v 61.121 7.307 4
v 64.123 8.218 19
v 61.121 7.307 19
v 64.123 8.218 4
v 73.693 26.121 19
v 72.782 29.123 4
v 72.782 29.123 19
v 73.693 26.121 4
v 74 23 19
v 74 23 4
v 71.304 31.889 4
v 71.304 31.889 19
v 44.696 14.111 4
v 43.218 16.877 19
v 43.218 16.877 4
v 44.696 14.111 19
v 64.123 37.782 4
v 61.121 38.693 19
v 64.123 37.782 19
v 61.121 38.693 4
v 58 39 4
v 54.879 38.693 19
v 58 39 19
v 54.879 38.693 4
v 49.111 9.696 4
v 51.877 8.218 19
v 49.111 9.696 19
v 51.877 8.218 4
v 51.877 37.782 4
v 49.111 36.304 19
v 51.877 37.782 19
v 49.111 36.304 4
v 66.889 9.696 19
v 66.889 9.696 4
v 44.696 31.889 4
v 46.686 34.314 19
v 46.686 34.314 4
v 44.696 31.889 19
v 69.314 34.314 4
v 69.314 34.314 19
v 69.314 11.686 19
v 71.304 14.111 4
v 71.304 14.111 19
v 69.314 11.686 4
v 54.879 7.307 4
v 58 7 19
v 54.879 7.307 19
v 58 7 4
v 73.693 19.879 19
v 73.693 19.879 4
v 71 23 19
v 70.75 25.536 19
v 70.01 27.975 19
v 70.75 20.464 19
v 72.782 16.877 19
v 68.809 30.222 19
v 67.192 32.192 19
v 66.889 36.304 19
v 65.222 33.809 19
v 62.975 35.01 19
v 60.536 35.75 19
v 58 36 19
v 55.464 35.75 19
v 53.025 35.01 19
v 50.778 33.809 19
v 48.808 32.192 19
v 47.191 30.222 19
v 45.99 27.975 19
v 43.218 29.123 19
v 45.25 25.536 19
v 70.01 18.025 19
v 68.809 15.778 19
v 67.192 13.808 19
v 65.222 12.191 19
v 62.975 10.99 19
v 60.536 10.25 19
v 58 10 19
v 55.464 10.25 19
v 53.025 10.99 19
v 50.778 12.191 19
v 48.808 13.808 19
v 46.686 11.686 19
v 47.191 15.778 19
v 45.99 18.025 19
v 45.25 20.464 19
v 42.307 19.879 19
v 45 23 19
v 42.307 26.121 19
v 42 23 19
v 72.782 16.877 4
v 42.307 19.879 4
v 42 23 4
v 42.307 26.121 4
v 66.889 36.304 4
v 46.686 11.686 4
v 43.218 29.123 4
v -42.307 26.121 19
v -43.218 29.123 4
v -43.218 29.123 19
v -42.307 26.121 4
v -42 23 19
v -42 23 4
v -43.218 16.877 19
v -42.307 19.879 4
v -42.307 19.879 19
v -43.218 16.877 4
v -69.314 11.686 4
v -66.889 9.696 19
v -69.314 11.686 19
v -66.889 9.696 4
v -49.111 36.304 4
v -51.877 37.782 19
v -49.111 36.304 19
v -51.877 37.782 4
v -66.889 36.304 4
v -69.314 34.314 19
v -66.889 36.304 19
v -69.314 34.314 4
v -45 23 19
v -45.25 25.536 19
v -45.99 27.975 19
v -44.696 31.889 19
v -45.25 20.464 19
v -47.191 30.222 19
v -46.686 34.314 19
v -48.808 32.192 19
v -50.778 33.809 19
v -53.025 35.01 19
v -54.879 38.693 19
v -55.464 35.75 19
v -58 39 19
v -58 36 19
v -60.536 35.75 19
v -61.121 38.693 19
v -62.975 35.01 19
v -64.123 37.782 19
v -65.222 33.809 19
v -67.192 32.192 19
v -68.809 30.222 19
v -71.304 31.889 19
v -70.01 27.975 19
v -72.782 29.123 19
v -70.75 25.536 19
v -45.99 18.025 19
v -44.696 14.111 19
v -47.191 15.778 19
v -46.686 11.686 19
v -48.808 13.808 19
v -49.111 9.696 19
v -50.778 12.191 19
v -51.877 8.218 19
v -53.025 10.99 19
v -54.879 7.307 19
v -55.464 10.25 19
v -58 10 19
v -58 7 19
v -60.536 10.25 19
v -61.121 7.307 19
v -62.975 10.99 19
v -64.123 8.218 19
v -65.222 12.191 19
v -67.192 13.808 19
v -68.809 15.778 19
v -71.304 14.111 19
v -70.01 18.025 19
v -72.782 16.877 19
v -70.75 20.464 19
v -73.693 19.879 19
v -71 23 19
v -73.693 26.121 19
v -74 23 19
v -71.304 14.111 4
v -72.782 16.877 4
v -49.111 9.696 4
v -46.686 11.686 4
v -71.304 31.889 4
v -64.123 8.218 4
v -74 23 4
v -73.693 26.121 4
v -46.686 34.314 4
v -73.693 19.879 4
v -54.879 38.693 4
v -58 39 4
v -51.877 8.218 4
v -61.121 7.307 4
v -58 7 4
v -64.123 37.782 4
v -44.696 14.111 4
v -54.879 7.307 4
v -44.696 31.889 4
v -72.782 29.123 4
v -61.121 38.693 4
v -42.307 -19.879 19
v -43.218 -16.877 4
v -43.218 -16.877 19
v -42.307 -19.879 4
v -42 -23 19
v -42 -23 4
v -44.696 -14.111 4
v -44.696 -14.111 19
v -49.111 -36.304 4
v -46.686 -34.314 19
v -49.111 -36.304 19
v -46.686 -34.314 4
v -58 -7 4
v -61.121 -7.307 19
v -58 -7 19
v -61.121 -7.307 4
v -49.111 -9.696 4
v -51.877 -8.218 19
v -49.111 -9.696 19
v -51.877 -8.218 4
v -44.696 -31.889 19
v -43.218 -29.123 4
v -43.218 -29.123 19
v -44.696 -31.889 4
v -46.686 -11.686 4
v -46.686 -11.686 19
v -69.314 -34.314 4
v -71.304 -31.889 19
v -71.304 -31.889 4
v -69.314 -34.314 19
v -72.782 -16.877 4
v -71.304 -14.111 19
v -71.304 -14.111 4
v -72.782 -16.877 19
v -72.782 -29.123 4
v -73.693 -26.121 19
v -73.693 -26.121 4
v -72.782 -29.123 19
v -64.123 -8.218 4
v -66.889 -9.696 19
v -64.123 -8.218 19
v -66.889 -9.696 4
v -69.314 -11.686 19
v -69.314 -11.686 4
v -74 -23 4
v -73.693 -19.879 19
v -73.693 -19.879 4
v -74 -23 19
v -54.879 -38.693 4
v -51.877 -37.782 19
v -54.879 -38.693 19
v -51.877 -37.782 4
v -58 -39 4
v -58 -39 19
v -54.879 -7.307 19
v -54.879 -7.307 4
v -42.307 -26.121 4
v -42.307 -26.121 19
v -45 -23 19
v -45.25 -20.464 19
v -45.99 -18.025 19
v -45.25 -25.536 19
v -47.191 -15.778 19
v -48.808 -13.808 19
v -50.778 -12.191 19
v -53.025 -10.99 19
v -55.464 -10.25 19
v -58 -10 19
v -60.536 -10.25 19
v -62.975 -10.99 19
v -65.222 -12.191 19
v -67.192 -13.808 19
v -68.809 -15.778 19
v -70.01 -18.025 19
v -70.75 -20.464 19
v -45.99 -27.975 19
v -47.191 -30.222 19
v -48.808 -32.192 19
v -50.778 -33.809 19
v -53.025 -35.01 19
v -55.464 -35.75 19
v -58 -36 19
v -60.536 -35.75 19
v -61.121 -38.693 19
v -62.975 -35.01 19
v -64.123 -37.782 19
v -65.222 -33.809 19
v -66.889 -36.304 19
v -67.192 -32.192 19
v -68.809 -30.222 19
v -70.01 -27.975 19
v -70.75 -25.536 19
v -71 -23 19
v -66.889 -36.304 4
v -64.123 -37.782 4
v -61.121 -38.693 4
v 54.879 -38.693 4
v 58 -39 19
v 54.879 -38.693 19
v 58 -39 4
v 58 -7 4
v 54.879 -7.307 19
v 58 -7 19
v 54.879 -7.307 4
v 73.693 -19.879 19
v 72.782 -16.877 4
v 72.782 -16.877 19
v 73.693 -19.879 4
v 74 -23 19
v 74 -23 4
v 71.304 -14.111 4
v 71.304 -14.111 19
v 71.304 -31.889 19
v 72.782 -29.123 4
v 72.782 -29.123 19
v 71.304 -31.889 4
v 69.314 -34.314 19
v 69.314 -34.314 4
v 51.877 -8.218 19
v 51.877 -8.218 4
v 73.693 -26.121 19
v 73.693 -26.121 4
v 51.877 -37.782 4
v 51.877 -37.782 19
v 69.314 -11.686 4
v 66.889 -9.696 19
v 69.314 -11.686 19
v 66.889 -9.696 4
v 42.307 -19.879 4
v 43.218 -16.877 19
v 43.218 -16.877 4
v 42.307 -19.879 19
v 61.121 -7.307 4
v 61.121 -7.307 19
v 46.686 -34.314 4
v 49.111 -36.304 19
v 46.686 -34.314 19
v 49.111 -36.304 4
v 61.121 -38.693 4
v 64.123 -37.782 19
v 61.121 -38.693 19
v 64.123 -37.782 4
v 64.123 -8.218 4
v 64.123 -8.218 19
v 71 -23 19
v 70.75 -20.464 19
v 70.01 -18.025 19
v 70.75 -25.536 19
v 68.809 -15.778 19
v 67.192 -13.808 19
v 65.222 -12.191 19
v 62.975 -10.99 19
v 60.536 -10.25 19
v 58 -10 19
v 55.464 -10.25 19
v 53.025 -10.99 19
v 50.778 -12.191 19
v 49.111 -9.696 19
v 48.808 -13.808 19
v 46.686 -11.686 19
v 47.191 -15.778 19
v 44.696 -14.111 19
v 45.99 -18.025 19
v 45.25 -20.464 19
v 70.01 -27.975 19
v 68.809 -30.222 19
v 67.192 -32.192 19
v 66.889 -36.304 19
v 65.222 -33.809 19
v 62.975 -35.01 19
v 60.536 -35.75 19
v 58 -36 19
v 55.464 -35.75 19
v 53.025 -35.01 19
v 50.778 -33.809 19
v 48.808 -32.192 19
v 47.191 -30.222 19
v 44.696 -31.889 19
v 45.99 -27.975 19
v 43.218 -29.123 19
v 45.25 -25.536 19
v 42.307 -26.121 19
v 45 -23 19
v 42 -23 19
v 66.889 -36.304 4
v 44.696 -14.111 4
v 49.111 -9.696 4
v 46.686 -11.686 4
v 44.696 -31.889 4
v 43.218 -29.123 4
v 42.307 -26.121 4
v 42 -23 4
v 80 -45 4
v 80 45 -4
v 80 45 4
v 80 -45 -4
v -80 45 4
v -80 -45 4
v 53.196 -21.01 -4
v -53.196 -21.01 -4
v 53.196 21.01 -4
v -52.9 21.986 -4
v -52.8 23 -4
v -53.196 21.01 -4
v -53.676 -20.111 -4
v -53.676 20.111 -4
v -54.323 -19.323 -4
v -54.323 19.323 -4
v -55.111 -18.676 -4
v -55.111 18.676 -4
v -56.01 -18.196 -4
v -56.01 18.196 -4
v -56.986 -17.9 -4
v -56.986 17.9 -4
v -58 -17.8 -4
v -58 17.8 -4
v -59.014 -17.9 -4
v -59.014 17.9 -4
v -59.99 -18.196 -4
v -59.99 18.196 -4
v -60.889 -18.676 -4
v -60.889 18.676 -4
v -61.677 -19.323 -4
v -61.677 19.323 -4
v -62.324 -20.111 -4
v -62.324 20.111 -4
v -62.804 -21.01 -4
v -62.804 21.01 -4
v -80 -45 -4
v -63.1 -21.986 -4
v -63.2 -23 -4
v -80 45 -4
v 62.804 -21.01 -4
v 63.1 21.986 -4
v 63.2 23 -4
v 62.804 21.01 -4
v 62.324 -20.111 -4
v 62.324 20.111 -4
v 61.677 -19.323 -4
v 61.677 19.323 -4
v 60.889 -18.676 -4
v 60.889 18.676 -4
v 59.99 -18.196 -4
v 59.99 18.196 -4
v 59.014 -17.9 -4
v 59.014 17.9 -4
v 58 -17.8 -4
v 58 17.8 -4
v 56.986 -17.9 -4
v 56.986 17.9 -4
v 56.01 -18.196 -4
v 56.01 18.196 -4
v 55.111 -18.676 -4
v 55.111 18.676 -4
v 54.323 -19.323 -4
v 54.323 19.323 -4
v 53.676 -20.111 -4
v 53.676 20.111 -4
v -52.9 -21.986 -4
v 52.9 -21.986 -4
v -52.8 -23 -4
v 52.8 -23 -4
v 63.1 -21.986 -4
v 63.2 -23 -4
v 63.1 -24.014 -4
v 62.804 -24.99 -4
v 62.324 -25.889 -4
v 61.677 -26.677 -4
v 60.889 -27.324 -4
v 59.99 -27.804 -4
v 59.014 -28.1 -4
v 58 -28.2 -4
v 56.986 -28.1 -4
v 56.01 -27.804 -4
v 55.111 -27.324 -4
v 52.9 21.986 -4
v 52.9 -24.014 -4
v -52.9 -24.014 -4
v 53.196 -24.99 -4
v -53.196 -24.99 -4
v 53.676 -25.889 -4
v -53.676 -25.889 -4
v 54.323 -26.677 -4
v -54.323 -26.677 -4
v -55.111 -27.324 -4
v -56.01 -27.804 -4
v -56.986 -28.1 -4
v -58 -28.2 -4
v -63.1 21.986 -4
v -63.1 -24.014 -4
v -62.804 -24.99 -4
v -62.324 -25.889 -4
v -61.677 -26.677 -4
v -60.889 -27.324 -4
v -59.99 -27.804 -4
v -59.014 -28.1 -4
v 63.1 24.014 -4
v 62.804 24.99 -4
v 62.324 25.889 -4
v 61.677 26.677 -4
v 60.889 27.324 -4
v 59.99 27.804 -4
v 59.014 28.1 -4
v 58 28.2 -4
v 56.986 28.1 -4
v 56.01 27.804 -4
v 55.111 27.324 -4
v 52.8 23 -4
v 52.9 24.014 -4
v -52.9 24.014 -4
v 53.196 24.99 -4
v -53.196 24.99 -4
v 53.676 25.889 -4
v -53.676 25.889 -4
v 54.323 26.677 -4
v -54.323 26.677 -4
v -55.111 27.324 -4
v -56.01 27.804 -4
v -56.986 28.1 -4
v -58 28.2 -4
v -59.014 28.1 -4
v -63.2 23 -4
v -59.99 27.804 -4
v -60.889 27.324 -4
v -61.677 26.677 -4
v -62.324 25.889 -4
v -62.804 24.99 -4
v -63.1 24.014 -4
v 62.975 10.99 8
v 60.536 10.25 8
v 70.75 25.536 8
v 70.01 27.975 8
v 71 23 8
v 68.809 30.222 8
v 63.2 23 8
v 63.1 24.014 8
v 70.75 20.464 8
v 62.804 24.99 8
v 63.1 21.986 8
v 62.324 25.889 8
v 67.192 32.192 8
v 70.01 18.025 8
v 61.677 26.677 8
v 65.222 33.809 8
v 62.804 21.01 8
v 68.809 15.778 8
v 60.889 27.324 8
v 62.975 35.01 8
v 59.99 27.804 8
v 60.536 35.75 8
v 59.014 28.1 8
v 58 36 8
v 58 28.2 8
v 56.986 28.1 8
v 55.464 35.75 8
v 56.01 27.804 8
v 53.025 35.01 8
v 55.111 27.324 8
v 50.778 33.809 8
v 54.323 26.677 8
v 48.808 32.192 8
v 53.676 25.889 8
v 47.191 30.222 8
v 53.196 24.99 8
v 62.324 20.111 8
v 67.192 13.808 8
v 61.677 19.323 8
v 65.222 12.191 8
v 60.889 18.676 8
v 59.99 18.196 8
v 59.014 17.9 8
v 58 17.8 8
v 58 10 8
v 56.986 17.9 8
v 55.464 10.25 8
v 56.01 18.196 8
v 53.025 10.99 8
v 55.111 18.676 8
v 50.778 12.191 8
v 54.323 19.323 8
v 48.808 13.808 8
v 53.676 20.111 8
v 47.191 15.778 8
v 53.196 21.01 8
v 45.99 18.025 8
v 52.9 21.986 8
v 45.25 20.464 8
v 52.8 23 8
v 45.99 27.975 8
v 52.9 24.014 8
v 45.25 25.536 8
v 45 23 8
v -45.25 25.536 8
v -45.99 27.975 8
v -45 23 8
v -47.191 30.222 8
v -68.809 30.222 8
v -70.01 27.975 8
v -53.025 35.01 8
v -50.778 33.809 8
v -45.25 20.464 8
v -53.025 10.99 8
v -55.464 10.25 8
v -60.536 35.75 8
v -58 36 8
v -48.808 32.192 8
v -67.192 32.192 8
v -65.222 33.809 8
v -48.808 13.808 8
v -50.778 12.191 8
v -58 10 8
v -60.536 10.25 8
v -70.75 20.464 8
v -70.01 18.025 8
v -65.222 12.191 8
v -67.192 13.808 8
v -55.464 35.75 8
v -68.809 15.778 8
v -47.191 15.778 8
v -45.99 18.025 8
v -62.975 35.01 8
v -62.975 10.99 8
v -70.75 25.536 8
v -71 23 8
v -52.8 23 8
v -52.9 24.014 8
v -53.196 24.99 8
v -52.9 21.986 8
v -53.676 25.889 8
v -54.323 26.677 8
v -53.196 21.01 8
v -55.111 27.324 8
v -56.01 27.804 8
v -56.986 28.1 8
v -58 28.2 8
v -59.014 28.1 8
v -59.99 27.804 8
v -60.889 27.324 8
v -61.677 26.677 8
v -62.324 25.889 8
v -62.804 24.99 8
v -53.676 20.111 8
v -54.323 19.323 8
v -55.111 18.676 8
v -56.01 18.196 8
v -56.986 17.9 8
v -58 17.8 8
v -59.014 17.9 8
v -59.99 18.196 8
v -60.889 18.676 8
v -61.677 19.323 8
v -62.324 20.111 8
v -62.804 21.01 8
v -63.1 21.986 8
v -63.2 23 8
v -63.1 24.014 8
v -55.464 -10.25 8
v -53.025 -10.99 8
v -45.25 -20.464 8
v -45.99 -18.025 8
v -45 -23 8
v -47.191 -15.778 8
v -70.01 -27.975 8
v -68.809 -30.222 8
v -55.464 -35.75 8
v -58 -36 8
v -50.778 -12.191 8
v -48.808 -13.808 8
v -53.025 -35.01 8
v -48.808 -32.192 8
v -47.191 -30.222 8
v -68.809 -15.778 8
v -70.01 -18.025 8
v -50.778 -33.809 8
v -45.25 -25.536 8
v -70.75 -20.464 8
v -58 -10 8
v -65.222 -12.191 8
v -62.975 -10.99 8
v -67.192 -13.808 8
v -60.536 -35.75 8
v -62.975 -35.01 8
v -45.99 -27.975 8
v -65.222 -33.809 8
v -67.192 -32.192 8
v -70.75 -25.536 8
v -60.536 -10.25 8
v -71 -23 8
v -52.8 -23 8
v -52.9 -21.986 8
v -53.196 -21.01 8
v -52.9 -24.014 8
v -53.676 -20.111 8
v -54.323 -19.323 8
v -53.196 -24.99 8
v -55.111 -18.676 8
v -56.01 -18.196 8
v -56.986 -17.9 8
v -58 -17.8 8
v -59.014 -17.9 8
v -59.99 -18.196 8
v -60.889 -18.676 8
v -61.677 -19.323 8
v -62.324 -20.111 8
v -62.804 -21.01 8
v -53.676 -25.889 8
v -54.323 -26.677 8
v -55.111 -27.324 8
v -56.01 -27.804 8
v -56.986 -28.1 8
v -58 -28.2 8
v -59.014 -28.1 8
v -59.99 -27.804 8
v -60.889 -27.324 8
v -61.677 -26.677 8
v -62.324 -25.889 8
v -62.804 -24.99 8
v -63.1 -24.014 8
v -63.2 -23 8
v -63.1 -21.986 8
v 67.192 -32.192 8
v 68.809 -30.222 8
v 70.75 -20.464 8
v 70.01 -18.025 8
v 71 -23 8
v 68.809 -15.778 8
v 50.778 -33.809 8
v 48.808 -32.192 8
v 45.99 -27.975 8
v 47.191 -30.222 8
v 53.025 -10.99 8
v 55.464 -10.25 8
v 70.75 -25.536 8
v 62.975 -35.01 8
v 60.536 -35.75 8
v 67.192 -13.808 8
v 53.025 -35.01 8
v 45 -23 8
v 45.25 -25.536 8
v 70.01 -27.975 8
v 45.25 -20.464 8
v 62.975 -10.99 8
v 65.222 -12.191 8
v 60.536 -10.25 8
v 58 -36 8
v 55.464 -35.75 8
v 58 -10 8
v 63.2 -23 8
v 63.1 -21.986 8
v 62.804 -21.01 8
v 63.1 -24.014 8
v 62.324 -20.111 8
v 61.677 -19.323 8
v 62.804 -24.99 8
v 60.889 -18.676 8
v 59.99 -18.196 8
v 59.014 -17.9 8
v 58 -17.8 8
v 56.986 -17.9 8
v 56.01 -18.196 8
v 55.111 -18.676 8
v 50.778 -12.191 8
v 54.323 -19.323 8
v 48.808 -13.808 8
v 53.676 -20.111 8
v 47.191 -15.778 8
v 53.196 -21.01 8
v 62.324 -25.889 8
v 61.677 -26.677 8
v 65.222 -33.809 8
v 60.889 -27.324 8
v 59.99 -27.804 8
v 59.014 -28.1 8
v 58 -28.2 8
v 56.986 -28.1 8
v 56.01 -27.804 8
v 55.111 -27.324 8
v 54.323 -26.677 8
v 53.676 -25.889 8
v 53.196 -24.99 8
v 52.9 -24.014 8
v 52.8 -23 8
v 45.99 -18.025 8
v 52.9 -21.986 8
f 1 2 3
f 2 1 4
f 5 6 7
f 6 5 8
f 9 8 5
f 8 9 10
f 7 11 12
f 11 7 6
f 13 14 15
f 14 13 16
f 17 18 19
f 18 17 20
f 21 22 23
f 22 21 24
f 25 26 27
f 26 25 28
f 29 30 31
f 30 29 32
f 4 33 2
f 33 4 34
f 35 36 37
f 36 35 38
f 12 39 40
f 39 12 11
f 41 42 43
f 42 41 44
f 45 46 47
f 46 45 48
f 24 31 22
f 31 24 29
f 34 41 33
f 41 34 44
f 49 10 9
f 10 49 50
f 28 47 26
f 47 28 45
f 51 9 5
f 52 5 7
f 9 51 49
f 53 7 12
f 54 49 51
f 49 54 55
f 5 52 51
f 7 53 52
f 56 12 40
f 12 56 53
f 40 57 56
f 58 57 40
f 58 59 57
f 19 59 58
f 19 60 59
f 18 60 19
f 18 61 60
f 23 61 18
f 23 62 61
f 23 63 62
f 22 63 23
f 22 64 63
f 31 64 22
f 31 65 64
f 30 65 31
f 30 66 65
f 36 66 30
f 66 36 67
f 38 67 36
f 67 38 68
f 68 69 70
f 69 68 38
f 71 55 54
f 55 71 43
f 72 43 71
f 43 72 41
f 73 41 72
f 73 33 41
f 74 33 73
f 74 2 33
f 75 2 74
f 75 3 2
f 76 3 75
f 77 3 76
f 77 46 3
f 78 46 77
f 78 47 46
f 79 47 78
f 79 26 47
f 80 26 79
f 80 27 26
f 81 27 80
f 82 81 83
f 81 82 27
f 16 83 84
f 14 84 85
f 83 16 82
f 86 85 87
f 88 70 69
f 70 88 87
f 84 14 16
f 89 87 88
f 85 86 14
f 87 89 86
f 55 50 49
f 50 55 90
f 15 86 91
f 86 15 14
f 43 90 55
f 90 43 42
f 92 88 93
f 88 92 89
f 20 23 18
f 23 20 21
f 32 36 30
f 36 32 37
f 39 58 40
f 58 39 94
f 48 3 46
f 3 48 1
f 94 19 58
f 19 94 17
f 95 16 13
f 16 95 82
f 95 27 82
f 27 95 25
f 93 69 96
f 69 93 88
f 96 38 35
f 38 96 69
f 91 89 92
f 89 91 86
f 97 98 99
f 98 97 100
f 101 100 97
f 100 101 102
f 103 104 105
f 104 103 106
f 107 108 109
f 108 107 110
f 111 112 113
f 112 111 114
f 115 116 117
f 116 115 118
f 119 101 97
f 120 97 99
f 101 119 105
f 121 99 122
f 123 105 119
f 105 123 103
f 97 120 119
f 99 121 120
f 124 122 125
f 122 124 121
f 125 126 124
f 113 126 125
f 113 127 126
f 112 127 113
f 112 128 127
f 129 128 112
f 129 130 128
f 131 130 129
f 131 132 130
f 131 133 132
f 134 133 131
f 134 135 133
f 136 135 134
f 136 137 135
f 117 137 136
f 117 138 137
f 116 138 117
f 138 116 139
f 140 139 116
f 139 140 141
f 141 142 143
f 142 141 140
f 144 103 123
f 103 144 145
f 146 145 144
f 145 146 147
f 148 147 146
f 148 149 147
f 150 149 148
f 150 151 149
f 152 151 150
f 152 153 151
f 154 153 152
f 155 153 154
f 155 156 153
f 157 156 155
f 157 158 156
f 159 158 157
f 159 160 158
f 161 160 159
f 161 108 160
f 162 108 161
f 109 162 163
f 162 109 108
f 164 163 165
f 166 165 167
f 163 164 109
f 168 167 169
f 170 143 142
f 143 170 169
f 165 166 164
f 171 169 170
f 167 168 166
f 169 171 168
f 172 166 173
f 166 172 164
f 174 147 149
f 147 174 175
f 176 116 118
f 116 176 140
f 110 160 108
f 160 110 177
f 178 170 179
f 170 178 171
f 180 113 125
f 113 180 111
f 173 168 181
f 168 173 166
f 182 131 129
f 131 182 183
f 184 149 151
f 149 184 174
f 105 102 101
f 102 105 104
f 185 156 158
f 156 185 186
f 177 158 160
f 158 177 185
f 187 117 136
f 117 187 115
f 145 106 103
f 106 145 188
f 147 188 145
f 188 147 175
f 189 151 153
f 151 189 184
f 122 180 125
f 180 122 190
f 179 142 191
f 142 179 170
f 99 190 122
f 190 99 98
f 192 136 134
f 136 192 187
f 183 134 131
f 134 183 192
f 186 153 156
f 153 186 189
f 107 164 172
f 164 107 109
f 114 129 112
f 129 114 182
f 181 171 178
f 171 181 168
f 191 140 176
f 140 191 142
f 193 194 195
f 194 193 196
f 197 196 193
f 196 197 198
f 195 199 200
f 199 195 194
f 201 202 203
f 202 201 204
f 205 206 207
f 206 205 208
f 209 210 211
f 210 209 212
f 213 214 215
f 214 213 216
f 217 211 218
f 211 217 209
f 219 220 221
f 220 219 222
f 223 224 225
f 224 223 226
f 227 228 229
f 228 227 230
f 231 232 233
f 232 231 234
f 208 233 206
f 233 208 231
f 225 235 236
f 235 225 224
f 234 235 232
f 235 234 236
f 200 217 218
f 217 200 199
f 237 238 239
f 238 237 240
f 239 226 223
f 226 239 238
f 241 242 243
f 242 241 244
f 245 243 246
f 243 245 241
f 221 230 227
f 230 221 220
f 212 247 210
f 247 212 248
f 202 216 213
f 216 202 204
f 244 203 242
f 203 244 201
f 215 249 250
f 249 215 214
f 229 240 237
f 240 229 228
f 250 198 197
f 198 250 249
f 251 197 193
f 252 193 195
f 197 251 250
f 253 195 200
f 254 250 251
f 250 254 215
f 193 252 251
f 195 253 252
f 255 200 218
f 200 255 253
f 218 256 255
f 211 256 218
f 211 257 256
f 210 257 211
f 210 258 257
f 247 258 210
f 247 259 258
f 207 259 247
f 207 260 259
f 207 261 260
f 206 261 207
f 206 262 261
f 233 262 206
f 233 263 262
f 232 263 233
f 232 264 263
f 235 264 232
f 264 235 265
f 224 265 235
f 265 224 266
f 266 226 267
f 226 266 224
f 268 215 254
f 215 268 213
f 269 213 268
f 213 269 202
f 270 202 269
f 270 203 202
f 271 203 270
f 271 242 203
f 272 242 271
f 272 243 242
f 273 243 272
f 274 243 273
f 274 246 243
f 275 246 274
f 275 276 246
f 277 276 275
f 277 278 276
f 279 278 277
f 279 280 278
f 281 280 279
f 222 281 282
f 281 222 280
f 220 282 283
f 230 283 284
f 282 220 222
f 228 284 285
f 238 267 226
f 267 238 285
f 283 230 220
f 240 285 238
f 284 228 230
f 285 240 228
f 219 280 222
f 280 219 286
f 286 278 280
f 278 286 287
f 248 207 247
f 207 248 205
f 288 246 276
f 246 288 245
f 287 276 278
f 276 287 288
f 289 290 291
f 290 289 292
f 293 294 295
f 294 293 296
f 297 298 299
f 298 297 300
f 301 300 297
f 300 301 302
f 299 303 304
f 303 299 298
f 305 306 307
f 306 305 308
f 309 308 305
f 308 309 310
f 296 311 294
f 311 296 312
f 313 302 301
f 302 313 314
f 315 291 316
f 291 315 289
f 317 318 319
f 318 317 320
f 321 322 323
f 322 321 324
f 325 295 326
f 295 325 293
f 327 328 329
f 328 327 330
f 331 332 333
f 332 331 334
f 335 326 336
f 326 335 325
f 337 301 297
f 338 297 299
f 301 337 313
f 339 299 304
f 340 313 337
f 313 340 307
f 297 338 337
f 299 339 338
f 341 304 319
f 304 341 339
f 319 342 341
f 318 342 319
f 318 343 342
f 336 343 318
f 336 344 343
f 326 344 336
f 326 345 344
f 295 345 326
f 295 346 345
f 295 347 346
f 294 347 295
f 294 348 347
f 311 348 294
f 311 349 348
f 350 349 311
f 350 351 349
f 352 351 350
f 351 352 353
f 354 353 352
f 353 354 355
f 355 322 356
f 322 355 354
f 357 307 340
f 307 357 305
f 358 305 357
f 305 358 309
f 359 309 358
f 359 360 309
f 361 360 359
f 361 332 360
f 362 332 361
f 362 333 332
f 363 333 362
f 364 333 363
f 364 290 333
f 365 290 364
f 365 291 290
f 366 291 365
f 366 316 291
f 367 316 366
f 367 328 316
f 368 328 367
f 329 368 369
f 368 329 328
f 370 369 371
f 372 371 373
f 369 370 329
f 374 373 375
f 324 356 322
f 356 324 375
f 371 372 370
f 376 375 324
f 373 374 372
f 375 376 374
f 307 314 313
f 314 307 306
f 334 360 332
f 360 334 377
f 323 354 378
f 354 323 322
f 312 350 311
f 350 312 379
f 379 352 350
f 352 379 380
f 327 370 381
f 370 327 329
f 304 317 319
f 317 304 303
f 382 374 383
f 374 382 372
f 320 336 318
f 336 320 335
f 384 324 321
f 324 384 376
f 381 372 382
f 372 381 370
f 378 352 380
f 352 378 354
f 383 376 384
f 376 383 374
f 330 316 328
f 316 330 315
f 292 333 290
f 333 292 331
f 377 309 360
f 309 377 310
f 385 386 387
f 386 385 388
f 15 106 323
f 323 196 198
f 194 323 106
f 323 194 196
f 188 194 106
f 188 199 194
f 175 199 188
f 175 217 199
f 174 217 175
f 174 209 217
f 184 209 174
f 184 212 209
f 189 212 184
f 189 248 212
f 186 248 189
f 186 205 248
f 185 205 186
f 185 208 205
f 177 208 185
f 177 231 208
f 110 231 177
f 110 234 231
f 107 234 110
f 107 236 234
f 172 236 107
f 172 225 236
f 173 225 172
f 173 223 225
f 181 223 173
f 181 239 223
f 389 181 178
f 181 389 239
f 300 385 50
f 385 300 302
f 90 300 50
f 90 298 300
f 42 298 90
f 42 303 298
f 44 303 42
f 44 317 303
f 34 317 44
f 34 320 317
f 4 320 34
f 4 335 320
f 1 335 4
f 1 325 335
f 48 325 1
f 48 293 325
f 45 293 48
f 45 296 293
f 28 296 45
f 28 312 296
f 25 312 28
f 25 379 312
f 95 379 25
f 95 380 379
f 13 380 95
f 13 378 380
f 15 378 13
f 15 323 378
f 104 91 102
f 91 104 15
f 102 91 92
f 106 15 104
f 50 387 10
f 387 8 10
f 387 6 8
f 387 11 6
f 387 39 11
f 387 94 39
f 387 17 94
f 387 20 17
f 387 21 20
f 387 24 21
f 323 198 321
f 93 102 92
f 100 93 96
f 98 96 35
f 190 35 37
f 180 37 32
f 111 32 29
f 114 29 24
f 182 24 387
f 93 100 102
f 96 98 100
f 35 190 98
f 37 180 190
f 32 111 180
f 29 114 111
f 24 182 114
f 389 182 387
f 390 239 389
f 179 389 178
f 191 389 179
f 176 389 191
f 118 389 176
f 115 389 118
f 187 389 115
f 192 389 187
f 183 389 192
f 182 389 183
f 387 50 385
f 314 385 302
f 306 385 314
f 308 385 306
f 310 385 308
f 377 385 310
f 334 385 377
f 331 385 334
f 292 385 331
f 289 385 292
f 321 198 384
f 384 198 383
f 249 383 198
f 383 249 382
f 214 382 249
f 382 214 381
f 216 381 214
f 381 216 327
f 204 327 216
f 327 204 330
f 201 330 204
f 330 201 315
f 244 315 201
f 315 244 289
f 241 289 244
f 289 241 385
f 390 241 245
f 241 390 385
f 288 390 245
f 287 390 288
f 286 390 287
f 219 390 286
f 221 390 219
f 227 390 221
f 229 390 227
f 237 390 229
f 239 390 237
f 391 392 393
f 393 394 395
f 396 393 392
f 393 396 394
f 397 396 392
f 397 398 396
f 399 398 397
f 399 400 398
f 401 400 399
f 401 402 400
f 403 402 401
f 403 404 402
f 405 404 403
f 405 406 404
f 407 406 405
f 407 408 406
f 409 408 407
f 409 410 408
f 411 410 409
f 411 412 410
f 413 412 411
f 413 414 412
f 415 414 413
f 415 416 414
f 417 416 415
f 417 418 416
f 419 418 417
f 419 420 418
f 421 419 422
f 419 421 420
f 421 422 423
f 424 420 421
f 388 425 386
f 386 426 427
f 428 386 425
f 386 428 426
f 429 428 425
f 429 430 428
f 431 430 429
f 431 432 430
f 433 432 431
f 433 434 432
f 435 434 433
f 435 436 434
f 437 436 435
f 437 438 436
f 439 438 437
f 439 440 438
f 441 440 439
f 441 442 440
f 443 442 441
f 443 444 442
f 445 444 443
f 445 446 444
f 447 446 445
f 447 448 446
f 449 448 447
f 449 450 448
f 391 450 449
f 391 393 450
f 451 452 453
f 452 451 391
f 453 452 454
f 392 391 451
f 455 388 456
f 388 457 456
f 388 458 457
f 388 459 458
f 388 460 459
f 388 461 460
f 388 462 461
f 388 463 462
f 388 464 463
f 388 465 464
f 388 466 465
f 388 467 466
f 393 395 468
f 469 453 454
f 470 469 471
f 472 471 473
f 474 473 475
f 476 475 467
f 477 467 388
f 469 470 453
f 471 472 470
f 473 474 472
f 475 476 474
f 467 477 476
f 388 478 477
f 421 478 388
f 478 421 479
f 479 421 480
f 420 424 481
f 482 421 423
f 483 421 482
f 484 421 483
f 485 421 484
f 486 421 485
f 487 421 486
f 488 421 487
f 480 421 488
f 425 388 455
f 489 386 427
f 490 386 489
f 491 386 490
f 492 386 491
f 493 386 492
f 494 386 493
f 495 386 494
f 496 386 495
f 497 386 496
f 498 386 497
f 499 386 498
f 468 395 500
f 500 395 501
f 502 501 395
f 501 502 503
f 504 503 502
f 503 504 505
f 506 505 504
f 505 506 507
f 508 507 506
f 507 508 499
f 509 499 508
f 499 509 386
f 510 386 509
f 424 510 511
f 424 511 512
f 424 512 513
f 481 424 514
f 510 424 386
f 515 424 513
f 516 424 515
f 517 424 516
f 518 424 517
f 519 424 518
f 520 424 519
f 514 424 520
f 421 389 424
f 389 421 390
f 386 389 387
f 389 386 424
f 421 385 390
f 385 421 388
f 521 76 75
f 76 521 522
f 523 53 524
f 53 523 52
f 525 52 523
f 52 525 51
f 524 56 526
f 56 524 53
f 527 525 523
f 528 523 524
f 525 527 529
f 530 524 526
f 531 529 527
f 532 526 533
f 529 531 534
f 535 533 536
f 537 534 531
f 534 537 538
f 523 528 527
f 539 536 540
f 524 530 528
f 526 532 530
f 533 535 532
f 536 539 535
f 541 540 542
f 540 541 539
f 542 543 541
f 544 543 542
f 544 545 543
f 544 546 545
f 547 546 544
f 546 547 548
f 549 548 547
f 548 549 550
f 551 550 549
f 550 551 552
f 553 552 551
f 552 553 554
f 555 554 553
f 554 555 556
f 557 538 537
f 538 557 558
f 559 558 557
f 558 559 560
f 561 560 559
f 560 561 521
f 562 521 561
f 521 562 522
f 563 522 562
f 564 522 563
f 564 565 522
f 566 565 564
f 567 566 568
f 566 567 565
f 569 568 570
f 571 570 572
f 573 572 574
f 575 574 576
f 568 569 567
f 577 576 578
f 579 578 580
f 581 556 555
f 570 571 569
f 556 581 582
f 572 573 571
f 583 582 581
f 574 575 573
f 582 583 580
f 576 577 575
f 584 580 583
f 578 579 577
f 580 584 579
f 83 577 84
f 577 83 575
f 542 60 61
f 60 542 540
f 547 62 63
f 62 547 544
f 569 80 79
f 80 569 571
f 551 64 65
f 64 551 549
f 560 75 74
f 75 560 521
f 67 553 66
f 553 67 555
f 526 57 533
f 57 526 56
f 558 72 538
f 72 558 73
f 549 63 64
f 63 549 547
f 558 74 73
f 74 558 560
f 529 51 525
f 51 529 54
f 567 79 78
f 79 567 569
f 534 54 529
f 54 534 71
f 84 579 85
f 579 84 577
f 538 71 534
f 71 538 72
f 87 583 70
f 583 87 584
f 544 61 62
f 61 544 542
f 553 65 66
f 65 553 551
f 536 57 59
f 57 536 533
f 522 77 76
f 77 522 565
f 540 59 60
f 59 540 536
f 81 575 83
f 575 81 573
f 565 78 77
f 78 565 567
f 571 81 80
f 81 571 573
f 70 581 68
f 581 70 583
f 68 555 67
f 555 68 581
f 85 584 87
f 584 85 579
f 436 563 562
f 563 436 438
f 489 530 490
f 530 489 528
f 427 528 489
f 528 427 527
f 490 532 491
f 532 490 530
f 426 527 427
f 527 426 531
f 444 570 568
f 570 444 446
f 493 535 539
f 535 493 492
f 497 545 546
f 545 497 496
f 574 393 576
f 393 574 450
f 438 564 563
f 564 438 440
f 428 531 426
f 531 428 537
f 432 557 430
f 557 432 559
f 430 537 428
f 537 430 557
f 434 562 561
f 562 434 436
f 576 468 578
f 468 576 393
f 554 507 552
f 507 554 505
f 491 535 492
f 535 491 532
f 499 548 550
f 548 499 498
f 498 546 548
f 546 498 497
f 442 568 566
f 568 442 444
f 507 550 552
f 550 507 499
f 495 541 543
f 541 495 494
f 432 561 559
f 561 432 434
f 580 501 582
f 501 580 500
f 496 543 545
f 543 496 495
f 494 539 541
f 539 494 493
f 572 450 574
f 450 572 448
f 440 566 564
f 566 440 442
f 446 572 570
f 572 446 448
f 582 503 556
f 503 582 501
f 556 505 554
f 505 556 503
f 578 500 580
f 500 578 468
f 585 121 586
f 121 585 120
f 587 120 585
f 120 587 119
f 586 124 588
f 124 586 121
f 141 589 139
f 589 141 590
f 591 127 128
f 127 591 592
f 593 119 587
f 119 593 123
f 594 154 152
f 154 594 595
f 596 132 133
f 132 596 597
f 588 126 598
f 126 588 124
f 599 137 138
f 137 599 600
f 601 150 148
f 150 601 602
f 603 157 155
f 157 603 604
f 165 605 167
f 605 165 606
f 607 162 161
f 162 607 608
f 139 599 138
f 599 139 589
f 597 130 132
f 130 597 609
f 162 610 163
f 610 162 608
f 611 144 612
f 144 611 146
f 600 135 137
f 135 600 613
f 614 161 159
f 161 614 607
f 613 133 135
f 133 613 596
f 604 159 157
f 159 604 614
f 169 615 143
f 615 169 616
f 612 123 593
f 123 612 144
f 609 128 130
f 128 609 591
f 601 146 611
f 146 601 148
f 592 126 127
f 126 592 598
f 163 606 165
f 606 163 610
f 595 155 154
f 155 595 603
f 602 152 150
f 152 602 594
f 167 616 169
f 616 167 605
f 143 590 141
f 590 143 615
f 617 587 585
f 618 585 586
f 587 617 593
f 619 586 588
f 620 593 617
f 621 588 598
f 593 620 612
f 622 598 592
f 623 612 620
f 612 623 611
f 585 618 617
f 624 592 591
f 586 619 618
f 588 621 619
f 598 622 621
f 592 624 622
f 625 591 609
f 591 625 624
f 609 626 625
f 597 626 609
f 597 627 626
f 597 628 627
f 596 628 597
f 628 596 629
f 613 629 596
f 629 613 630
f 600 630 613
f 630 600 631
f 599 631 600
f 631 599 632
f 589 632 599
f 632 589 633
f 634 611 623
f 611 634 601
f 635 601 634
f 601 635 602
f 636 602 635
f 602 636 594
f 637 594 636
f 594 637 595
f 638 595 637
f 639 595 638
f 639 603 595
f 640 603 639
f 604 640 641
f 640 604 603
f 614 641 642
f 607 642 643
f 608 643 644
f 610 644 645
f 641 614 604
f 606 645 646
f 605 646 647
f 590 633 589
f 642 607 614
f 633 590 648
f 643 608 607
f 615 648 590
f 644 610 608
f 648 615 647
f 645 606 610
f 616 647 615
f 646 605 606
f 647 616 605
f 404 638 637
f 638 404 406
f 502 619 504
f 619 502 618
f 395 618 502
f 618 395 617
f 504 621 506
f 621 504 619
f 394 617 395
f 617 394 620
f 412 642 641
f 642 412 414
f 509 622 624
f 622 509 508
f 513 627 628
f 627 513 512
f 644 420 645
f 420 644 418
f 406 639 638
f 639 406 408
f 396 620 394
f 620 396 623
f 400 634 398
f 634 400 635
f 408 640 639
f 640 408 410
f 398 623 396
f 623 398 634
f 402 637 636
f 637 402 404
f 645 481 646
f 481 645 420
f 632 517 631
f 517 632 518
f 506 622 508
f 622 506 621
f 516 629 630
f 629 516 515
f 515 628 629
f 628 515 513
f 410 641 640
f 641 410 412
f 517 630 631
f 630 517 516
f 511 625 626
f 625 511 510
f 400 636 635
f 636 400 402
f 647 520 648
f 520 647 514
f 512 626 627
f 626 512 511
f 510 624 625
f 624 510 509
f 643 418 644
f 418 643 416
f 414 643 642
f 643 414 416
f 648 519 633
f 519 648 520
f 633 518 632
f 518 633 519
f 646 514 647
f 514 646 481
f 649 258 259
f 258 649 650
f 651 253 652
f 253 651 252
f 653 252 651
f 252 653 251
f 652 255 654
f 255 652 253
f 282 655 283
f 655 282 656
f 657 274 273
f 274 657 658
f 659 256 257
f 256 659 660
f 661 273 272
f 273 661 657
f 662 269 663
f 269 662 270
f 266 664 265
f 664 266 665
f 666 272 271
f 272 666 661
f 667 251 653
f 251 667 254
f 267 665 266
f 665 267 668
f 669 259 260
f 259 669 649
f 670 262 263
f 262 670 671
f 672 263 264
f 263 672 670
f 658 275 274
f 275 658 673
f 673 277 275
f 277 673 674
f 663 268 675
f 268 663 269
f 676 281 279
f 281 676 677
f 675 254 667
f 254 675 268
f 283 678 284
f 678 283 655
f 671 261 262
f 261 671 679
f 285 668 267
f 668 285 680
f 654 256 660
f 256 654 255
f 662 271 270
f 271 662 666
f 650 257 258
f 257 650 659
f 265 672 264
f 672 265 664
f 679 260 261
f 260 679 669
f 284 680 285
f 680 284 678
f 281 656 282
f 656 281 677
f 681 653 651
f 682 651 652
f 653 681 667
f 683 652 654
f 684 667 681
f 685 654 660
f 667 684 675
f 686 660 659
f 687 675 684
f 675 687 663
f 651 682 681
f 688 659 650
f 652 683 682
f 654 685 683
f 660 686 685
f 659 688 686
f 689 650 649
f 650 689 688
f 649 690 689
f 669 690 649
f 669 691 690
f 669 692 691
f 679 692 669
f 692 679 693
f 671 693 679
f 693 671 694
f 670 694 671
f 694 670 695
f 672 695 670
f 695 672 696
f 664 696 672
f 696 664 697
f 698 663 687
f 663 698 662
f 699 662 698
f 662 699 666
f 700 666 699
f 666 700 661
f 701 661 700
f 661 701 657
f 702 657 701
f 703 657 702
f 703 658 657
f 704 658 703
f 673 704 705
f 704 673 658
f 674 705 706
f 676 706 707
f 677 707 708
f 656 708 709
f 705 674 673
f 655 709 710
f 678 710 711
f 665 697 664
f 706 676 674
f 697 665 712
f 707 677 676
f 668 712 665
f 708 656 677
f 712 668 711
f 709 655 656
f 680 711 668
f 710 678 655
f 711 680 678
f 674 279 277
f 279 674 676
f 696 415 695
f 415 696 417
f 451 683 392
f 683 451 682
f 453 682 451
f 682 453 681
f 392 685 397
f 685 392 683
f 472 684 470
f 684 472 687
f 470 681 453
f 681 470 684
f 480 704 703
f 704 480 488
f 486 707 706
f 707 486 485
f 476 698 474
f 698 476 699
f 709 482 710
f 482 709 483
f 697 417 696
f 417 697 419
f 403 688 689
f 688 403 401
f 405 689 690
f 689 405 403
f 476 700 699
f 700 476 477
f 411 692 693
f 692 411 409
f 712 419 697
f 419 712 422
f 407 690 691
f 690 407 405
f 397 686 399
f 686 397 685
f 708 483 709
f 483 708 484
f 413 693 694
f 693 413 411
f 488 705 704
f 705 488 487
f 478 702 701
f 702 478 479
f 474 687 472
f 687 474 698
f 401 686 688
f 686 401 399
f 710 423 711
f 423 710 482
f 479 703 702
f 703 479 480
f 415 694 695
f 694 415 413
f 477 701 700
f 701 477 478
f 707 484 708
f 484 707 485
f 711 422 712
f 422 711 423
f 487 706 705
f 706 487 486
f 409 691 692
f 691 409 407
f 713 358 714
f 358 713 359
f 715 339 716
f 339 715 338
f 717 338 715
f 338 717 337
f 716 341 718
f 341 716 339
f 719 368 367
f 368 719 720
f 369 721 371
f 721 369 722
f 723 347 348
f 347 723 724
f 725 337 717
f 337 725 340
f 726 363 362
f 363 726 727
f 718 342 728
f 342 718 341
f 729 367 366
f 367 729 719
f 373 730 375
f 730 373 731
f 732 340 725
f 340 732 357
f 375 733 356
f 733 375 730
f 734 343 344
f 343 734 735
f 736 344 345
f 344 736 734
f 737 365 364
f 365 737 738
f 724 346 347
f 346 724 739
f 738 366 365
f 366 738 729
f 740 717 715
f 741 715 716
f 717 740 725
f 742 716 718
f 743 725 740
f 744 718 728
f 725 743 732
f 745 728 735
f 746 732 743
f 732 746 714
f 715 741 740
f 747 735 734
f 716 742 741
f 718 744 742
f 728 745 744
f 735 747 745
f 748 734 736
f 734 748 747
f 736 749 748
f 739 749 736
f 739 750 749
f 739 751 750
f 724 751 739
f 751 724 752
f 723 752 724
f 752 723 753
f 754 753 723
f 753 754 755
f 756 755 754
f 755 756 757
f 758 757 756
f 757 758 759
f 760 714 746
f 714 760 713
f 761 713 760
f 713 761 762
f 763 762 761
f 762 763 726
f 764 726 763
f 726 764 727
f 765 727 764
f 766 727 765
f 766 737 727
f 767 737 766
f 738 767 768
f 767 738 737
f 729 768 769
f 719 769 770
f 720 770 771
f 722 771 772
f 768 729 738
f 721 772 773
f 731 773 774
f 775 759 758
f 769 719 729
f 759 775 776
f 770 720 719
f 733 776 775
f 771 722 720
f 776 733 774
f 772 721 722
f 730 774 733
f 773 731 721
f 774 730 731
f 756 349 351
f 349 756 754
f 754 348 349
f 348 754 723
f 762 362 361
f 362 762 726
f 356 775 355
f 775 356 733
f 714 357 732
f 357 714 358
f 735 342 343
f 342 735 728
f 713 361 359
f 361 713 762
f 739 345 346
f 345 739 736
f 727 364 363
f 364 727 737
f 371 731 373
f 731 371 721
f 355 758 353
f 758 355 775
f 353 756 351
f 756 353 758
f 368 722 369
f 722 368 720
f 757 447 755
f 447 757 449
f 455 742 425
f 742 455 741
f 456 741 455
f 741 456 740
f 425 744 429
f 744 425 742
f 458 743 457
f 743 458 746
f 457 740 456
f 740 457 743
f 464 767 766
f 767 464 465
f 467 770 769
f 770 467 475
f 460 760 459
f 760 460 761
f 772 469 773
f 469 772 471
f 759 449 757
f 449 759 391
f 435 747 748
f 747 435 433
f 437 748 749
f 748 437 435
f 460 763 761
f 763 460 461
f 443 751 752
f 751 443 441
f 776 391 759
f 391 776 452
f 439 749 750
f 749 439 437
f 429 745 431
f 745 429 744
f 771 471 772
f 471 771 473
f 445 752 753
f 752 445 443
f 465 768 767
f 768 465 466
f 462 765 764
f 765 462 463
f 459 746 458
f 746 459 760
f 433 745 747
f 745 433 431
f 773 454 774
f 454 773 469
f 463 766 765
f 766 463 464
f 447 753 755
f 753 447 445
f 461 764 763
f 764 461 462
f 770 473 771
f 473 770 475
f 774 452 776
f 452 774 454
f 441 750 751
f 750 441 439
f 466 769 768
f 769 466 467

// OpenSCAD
$fn = 32;

// ----------------------------------------------------------------------
// Socket pad plate
// bosses with counterbored sockets for the screws
// ----------------------------------------------------------------------

// --- parameters (mm) ---
base_t = 8;            // base plate thickness
boss_h = 15;           // boss height above the base plate
boss_d = 32;           // boss diameter
socket_d = 26;         // socket diameter
socket_depth = 11;     // socket depth from the boss face
bolt_d = 10.4;         // screw clearance hole through the socket floor
plate = [160, 90, 8];  // overall size (x, y, z)
edge = 22;             // boss centre offset from the plate edge
pads = 4;              // boss count, one per corner

// --- derived feature positions (mm) ---
height = base_t + boss_h;        // = 23   overall height of the part
corner_x = plate[0] / 2 - edge;  // = 58   boss centre X
corner_y = plate[1] / 2 - edge;  // = 23   boss centre Y
feature_centers = [
  [corner_x, corner_y],
  [-corner_x, corner_y],
  [-corner_x, -corner_y],
  [corner_x, -corner_y]
];   // boss centres: sockets, holes and the pads themselves are placed from here

// base plate, bosses on feature_centers, socket + through hole in each
difference() {
  union() {
    cube(plate, center = true);
    for (centre = feature_centers)
      translate([centre[0], centre[1], plate[2] / 2 - 1])
        cylinder(d = boss_d, h = boss_h + 1);
  }
  for (centre = feature_centers) {
    translate([centre[0], centre[1], plate[2] / 2 + boss_h - socket_depth])
      cylinder(d = socket_d, h = socket_depth + 1);
    translate([centre[0], centre[1], -height])
      cylinder(d = bolt_d, h = 2 * height + 2);  // through the socket floor
  }
}
